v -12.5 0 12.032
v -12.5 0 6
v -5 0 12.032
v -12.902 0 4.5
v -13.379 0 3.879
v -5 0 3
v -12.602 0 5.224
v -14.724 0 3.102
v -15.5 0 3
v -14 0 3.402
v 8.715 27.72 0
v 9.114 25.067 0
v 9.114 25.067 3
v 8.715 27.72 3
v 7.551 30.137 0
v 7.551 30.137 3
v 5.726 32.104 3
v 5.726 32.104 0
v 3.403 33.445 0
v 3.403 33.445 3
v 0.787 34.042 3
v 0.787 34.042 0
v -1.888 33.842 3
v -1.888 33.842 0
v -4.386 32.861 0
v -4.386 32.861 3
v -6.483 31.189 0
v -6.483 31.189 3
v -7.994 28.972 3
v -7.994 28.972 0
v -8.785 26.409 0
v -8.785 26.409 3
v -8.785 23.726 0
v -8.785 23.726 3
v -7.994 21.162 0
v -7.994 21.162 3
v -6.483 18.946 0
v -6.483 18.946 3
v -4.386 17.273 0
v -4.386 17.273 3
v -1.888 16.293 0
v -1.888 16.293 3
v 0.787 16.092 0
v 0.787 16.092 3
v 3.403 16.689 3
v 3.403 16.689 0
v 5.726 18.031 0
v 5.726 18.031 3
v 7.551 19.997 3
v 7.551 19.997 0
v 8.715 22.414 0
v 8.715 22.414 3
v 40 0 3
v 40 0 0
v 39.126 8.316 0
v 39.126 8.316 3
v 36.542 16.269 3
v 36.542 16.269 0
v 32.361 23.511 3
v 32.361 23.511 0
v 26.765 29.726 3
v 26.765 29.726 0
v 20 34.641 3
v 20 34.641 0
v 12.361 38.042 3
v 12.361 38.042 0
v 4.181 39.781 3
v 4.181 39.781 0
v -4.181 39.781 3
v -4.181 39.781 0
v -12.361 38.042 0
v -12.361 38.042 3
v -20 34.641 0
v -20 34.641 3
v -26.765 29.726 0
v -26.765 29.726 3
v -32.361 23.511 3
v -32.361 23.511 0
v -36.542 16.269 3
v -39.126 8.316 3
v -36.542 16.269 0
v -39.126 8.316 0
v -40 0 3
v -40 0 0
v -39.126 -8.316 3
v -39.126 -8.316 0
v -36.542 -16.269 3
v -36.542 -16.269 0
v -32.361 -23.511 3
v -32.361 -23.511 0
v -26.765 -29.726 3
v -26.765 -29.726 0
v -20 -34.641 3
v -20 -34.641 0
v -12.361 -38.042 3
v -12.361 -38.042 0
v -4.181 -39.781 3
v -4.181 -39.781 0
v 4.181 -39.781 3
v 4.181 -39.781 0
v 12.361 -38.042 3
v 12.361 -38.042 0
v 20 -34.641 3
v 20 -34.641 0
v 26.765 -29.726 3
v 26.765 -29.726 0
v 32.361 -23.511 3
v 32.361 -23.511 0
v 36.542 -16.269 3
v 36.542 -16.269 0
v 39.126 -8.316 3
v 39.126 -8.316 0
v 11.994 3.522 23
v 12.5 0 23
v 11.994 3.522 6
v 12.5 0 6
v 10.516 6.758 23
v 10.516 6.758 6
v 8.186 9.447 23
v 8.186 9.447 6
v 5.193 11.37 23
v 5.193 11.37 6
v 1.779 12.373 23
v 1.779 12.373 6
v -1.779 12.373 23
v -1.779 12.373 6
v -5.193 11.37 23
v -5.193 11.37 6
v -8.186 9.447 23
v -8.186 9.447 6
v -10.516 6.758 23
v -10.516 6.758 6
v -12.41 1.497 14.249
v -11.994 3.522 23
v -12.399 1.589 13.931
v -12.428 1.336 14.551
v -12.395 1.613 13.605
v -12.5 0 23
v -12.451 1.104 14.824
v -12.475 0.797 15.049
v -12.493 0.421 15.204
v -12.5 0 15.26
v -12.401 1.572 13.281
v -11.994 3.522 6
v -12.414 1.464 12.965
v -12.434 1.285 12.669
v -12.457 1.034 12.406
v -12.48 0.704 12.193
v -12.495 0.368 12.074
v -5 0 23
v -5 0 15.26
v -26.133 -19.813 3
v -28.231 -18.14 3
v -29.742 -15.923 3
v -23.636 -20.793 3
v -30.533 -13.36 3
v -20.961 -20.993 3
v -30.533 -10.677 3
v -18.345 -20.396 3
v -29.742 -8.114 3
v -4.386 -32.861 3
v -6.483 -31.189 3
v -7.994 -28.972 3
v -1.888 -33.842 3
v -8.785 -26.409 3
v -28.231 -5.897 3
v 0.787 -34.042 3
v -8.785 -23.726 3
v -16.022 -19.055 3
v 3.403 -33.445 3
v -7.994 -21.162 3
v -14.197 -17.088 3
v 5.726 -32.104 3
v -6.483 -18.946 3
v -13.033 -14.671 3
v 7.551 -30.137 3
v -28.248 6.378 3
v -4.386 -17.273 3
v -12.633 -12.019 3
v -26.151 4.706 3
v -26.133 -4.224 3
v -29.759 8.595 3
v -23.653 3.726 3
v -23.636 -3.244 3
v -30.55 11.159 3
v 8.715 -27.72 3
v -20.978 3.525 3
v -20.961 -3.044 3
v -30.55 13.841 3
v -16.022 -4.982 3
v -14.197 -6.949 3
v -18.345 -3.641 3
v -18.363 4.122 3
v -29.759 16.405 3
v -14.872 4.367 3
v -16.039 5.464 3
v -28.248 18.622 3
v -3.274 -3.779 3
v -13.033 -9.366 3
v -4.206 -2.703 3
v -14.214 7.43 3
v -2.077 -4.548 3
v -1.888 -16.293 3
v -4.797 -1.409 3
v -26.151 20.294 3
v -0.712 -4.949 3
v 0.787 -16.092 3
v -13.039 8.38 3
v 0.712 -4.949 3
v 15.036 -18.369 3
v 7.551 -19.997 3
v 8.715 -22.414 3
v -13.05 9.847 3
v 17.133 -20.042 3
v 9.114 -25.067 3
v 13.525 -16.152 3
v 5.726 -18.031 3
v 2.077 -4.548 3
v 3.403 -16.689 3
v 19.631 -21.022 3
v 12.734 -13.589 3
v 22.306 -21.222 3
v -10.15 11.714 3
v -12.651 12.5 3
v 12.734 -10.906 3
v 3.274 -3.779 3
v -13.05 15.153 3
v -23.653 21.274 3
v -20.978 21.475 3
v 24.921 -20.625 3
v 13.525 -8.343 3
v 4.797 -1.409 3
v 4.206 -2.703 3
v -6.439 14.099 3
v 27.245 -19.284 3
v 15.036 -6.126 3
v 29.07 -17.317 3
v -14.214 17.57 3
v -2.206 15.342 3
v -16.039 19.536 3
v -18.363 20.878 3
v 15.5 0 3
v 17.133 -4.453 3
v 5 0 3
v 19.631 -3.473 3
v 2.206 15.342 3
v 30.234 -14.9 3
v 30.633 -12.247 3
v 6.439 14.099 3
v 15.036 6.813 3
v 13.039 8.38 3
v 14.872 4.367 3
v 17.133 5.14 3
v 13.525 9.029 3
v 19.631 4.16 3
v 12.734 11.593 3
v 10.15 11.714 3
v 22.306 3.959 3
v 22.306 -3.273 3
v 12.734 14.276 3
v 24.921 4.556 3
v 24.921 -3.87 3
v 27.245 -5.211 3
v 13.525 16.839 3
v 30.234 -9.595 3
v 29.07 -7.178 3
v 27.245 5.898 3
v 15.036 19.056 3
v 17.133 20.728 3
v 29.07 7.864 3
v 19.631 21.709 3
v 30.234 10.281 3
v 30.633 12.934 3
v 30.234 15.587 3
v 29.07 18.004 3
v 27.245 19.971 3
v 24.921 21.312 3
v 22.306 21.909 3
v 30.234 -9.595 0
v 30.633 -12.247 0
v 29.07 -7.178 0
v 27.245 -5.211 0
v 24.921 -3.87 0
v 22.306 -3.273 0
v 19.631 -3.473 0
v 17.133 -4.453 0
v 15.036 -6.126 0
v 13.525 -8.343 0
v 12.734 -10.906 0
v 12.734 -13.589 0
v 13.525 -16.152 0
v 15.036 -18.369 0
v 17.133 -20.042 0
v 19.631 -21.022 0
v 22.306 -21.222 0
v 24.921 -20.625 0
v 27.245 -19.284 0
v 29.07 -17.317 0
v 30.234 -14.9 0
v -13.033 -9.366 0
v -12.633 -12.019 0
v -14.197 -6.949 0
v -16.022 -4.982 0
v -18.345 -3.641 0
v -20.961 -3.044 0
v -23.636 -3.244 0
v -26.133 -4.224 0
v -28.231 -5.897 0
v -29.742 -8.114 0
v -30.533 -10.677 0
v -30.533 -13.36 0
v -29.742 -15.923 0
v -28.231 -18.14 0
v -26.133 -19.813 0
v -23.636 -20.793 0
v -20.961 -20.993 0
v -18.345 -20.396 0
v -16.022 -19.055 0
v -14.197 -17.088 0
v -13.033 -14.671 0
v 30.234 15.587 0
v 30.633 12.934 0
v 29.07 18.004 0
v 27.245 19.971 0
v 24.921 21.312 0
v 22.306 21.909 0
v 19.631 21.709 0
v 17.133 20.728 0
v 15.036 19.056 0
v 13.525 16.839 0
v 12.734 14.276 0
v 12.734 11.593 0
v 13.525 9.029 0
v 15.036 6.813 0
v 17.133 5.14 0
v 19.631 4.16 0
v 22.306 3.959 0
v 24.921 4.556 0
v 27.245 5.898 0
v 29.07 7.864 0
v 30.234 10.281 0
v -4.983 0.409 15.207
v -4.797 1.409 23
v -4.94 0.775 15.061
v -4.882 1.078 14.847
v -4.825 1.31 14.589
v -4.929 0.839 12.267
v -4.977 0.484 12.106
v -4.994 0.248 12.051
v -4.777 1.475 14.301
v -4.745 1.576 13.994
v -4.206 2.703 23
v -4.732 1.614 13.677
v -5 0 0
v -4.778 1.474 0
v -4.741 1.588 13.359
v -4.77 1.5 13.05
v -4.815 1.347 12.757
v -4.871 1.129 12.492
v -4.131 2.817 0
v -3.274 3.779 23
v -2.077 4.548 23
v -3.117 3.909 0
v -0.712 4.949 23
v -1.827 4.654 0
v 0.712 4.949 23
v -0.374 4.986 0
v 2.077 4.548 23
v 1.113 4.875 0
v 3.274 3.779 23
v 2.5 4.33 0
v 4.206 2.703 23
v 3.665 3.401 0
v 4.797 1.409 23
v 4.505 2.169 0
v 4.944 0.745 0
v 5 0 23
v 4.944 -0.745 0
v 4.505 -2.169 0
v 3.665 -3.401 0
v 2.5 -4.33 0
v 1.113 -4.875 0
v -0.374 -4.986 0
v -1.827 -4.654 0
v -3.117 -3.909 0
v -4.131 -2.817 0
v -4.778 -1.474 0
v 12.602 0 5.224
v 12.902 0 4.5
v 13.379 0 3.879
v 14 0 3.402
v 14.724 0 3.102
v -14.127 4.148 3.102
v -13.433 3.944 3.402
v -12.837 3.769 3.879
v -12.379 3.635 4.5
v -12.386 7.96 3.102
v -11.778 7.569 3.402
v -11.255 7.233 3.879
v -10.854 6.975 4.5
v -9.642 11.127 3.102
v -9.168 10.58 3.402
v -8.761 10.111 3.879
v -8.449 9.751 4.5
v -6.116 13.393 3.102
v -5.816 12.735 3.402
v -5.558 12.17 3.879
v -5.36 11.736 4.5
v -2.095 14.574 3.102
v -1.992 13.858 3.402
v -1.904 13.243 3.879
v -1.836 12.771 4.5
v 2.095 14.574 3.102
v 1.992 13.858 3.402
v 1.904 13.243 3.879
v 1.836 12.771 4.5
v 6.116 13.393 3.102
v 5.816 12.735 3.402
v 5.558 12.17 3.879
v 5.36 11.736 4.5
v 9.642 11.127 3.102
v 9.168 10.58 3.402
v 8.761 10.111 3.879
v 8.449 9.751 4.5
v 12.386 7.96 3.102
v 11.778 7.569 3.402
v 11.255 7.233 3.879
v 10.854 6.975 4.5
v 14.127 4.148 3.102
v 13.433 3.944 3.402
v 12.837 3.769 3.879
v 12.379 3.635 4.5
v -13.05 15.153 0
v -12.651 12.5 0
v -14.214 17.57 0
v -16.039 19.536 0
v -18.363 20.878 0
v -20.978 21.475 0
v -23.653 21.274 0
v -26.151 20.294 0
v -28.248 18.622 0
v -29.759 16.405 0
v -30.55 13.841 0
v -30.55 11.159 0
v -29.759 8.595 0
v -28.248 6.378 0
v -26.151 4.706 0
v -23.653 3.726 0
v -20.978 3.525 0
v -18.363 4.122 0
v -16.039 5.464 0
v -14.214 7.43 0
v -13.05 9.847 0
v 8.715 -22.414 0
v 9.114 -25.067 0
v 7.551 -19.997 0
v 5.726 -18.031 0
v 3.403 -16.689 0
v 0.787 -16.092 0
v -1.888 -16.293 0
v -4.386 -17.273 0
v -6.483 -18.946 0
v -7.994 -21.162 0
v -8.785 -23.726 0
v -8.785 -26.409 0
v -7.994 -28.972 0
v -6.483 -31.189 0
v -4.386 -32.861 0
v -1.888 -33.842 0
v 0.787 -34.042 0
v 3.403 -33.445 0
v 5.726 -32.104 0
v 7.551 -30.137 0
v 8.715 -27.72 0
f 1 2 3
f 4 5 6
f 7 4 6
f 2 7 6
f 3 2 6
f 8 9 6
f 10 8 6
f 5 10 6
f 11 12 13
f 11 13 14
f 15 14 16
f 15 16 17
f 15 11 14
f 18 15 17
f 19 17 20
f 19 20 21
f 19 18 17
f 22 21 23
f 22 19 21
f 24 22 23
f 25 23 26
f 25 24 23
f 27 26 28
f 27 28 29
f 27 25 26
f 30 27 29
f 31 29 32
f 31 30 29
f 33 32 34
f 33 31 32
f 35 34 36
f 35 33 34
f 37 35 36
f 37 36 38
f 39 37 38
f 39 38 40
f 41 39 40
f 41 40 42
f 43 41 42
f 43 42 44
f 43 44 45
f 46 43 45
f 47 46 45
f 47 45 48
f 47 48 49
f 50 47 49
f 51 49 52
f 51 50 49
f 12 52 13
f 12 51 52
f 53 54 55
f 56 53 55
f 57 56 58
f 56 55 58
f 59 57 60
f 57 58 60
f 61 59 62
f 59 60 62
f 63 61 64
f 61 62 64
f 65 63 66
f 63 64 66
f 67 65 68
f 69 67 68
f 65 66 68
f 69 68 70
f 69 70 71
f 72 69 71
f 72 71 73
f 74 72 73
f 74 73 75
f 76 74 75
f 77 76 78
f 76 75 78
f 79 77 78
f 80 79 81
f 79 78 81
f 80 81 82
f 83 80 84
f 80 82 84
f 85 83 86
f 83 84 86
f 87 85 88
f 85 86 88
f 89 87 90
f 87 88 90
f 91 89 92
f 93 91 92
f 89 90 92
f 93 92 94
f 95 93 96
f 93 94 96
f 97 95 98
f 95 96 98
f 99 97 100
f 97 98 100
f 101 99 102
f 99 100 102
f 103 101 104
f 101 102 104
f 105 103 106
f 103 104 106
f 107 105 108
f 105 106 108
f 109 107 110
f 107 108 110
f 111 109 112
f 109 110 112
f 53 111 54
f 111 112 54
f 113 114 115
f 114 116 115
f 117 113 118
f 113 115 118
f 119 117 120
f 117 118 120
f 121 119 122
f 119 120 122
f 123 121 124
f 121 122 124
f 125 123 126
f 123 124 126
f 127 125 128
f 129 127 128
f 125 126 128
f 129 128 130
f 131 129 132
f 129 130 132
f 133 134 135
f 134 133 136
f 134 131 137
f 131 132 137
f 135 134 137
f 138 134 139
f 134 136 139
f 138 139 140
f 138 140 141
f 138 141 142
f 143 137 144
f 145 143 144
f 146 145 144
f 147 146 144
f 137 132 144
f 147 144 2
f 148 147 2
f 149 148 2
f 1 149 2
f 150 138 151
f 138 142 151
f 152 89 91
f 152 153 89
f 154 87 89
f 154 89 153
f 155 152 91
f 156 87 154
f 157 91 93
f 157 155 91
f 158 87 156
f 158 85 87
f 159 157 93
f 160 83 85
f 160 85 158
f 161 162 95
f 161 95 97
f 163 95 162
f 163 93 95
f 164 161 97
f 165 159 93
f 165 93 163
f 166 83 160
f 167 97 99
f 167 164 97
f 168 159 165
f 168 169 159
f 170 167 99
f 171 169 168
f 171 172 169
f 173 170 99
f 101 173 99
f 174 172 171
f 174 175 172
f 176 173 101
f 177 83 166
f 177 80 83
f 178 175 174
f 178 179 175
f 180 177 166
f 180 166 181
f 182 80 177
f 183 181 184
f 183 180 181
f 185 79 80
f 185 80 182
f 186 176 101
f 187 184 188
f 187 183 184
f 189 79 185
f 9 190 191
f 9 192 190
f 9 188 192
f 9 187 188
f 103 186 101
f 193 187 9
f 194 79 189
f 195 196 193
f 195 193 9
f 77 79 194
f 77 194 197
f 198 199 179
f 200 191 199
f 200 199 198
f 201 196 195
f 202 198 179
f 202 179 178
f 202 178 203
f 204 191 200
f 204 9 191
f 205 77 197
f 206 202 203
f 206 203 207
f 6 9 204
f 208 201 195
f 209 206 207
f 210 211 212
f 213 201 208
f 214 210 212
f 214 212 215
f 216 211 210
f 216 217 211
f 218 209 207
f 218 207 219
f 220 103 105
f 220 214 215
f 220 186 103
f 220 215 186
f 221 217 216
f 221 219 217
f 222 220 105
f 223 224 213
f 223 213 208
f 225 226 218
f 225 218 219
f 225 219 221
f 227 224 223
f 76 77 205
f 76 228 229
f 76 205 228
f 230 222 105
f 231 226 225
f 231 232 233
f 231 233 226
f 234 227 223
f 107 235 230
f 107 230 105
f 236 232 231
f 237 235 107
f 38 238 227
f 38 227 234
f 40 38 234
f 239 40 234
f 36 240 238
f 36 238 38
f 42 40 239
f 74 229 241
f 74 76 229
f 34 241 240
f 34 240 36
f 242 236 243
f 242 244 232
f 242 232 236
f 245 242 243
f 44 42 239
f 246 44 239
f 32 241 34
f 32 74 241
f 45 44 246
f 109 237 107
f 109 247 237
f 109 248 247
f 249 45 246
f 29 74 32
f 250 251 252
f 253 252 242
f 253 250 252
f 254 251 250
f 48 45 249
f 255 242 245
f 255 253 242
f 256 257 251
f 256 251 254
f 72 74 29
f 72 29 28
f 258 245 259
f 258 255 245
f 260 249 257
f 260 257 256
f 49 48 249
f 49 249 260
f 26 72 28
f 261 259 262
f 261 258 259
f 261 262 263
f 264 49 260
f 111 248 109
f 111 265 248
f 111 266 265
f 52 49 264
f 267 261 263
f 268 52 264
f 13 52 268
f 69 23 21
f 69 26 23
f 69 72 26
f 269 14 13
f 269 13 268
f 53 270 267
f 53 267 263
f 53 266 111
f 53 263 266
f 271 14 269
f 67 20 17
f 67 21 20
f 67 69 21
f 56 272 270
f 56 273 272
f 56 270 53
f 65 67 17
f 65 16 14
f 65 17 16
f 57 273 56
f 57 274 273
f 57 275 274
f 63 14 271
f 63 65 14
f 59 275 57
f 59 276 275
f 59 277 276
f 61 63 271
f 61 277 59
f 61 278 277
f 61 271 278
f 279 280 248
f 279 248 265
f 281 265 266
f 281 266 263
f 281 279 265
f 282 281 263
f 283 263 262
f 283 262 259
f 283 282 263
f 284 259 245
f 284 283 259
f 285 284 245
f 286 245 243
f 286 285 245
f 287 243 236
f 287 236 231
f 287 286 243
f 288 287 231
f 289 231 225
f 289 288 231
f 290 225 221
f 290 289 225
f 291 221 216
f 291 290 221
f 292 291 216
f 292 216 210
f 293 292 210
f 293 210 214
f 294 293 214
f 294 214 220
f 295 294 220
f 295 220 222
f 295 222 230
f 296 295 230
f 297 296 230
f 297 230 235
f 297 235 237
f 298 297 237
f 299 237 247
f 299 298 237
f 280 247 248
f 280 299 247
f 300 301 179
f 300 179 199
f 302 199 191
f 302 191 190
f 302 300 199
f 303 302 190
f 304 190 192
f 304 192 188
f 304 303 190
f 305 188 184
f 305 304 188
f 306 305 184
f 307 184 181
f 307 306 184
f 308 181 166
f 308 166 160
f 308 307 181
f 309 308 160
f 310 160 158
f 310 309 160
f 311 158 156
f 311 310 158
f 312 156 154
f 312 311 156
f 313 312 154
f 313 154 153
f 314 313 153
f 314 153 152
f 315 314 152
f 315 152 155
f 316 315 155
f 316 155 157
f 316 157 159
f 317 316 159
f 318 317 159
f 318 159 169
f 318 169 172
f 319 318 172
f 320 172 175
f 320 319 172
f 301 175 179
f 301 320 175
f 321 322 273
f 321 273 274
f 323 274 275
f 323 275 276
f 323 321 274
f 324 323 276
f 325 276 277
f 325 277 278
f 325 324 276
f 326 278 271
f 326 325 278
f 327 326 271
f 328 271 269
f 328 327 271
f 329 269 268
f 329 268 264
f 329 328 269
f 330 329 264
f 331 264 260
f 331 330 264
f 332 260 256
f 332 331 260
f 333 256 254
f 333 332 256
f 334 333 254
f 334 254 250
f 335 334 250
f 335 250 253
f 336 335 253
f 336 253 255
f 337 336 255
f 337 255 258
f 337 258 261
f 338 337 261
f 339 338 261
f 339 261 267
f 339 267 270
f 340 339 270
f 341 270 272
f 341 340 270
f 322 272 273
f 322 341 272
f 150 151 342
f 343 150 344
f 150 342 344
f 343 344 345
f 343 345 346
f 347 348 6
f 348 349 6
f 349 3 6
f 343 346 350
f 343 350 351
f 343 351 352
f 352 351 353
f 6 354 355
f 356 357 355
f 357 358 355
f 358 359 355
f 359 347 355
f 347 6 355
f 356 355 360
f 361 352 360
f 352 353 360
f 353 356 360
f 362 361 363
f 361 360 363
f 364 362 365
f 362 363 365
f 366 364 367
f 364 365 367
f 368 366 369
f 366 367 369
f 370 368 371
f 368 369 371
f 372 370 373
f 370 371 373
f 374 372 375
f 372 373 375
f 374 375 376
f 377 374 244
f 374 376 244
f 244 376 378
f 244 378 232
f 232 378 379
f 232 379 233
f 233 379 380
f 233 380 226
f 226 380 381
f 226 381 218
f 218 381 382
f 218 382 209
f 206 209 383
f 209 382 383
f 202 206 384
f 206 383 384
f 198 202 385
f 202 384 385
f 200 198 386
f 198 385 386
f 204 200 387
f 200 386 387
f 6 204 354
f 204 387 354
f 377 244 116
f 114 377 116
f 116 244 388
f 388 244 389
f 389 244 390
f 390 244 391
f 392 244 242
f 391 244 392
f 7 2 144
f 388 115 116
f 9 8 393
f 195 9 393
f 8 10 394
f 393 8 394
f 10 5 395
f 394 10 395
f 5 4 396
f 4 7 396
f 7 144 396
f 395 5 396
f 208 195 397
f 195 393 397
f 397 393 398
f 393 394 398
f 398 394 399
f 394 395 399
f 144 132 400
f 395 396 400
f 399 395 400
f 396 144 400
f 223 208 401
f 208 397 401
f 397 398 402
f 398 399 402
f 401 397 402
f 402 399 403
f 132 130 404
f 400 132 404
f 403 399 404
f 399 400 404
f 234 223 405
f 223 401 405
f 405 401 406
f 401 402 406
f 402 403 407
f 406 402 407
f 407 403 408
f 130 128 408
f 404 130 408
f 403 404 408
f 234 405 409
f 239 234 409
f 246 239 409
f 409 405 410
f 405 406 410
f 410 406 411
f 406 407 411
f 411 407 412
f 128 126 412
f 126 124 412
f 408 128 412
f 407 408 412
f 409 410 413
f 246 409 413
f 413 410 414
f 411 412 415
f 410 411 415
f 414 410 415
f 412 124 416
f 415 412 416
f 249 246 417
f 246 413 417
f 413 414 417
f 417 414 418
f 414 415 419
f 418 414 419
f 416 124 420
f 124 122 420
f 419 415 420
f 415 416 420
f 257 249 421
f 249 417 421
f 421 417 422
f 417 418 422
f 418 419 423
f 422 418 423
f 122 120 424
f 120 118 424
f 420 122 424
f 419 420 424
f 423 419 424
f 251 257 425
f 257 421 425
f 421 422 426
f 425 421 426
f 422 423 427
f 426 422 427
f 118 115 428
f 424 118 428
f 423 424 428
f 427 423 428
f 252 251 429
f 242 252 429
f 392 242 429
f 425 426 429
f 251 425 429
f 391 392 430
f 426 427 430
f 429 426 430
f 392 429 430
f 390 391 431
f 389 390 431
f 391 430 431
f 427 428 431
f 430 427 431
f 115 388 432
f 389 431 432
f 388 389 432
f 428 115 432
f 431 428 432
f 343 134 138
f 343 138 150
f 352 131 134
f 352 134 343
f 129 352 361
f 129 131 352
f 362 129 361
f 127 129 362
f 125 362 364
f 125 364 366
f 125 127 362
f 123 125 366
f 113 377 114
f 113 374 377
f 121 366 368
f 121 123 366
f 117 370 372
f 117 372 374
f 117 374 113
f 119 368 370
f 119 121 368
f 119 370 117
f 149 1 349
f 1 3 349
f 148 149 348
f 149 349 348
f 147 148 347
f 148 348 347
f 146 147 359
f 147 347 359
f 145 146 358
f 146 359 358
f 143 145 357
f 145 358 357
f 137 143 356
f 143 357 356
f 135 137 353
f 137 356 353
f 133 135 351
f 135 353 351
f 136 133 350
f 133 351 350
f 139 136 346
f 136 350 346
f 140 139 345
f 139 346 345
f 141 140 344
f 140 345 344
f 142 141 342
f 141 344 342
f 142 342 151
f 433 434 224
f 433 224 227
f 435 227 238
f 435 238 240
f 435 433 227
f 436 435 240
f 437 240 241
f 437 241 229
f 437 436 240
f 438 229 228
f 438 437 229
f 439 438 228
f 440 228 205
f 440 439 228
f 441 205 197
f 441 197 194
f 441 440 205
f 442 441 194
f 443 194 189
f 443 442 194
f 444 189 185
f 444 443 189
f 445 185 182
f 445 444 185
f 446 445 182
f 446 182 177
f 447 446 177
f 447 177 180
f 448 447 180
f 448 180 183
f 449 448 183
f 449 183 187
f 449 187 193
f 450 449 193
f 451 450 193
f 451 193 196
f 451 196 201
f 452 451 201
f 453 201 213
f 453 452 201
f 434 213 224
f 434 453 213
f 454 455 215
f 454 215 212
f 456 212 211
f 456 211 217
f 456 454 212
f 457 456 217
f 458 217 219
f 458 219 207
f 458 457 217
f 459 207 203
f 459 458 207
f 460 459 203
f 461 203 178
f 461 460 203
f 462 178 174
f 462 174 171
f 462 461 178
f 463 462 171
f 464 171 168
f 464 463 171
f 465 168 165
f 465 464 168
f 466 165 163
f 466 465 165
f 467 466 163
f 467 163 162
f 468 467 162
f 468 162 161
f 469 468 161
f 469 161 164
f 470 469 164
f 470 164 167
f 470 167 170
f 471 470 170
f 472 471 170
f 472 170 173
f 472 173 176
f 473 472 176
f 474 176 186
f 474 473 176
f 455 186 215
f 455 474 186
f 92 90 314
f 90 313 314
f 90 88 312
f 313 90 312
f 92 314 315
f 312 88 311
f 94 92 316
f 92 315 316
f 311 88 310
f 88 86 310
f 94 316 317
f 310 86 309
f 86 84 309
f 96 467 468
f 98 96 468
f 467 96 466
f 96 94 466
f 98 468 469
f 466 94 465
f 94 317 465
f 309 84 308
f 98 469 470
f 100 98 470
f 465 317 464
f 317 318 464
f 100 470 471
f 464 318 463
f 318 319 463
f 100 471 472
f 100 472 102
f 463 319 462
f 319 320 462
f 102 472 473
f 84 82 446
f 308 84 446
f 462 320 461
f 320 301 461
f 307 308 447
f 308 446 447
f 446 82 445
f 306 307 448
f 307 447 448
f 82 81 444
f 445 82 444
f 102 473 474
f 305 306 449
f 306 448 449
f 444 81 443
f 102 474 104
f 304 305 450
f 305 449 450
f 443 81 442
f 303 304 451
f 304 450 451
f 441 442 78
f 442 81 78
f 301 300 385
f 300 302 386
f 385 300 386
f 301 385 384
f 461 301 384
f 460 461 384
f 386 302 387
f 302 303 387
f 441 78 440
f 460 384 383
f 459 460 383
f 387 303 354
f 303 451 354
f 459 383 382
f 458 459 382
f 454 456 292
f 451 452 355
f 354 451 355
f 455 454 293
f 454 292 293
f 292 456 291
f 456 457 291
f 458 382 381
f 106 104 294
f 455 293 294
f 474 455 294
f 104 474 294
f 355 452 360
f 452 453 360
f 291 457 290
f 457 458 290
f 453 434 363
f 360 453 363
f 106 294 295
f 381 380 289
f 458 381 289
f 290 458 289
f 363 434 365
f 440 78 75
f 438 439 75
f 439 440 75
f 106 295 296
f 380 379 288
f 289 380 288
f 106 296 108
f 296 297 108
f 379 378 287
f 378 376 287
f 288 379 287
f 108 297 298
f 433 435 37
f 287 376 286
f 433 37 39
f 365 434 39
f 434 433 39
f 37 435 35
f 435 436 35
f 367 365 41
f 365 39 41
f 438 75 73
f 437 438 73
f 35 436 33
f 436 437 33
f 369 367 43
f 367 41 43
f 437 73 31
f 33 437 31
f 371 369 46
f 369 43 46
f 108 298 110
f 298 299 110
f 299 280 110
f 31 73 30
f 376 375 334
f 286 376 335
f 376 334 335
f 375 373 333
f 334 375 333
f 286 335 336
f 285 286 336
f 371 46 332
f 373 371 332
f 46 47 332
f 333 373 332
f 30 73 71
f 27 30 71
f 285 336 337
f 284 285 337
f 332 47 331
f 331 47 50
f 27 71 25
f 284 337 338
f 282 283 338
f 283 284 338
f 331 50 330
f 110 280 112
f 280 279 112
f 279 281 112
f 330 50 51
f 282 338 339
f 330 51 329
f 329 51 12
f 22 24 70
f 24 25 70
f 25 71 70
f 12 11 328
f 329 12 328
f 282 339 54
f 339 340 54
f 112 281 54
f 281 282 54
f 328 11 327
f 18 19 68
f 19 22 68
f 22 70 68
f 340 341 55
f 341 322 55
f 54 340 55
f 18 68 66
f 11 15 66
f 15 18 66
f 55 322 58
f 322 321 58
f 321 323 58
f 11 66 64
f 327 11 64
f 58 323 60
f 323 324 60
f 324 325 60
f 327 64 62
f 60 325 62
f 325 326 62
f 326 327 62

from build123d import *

# Parameters (mm, degrees)
F0_R     = 40
F0_R_2   = 9
F1_DEPTH = 3
F2_DEPTH = 18
F3_DEPTH = 25
F4_R     = 3
F5_R     = 1.614
F6_DEPTH = 40
F7_DEPTH = 5


with BuildPart() as f1:
    # F0 (on Top) → F1 (new body)
    with BuildSketch(Plane.XY):
        Circle(F0_R)
        with Locations((-21.6333586723, -12.0185324922)):
            Circle(F0_R_2, mode=Mode.SUBTRACT)
        with Locations((0.1144621056, -25.0672250986)):
            Circle(F0_R_2, mode=Mode.SUBTRACT)
        with Locations((21.6333605349, -12.247457169)):
            Circle(F0_R_2, mode=Mode.SUBTRACT)
        with Locations((-21.6506350946, 12.5)):
            Circle(F0_R_2, mode=Mode.SUBTRACT)
        with BuildLine():
            ThreePointArc((-12.5, 0), (0, 12.5), (12.5, 0))
            Line((12.5, 0), (5, 0))
            ThreePointArc((5, 0), (0, -5), (-5, 0))
            Line((-5, 0), (-12.5, 0))
        make_face(mode=Mode.SUBTRACT)
        with Locations((21.6333605349, 12.934230268)):
            Circle(F0_R_2, mode=Mode.SUBTRACT)
        with Locations((0.1144621056, 25.0672250986)):
            Circle(F0_R_2, mode=Mode.SUBTRACT)
        with BuildLine():
            Line((5, 0), (12.5, 0))
            ThreePointArc((12.5, 0), (0, 12.5), (-12.5, 0))
            Line((-12.5, 0), (-5, 0))
            ThreePointArc((-5, 0), (0, 5), (5, 0))
        make_face()
    extrude(amount=F1_DEPTH)

    # F0 (on Top) → F2 (join)
    with BuildSketch(Plane.XY):
        with BuildLine():
            Line((5, 0), (12.5, 0))
            ThreePointArc((12.5, 0), (0, 12.5), (-12.5, 0))
            Line((-12.5, 0), (-5, 0))
            ThreePointArc((-5, 0), (0, 5), (5, 0))
        make_face()
    extrude(amount=F2_DEPTH)

    # F0 (on Top) → F3 (cut)
    with BuildSketch(Plane.XY):
        Circle(F0_R)
        with Locations((-21.6333586723, -12.0185324922)):
            Circle(F0_R_2, mode=Mode.SUBTRACT)
        with Locations((0.1144621056, -25.0672250986)):
            Circle(F0_R_2, mode=Mode.SUBTRACT)
        with Locations((21.6333605349, -12.247457169)):
            Circle(F0_R_2, mode=Mode.SUBTRACT)
        with Locations((-21.6506350946, 12.5)):
            Circle(F0_R_2, mode=Mode.SUBTRACT)
        with BuildLine():
            ThreePointArc((-12.5, 0), (0, 12.5), (12.5, 0))
            Line((12.5, 0), (5, 0))
            ThreePointArc((5, 0), (0, -5), (-5, 0))
            Line((-5, 0), (-12.5, 0))
        make_face(mode=Mode.SUBTRACT)
        with Locations((21.6333605349, 12.934230268)):
            Circle(F0_R_2, mode=Mode.SUBTRACT)
        with Locations((0.1144621056, 25.0672250986)):
            Circle(F0_R_2, mode=Mode.SUBTRACT)
    extrude(amount=-F3_DEPTH, mode=Mode.SUBTRACT)

    # F4
    f4_edges = [f1.edges().sort_by_distance(p)[0] for p in [
        (0, 12.5, 3),
    ]]
    fillet(f4_edges, radius=F4_R)

    # F5 (on Right) → F6 (cut)
    with BuildSketch(Plane.YZ):
        with Locations((0, 13.645786792)):
            Circle(F5_R)
    extrude(amount=-F6_DEPTH, mode=Mode.SUBTRACT)

    # F7 (add): a face of the model
    f7_faces = [f1.faces().sort_by_distance(p)[0] for p in [
        (0, 5.9114693148, 18),
    ]]
    extrude(f7_faces, amount=F7_DEPTH)


solid = f1.part
